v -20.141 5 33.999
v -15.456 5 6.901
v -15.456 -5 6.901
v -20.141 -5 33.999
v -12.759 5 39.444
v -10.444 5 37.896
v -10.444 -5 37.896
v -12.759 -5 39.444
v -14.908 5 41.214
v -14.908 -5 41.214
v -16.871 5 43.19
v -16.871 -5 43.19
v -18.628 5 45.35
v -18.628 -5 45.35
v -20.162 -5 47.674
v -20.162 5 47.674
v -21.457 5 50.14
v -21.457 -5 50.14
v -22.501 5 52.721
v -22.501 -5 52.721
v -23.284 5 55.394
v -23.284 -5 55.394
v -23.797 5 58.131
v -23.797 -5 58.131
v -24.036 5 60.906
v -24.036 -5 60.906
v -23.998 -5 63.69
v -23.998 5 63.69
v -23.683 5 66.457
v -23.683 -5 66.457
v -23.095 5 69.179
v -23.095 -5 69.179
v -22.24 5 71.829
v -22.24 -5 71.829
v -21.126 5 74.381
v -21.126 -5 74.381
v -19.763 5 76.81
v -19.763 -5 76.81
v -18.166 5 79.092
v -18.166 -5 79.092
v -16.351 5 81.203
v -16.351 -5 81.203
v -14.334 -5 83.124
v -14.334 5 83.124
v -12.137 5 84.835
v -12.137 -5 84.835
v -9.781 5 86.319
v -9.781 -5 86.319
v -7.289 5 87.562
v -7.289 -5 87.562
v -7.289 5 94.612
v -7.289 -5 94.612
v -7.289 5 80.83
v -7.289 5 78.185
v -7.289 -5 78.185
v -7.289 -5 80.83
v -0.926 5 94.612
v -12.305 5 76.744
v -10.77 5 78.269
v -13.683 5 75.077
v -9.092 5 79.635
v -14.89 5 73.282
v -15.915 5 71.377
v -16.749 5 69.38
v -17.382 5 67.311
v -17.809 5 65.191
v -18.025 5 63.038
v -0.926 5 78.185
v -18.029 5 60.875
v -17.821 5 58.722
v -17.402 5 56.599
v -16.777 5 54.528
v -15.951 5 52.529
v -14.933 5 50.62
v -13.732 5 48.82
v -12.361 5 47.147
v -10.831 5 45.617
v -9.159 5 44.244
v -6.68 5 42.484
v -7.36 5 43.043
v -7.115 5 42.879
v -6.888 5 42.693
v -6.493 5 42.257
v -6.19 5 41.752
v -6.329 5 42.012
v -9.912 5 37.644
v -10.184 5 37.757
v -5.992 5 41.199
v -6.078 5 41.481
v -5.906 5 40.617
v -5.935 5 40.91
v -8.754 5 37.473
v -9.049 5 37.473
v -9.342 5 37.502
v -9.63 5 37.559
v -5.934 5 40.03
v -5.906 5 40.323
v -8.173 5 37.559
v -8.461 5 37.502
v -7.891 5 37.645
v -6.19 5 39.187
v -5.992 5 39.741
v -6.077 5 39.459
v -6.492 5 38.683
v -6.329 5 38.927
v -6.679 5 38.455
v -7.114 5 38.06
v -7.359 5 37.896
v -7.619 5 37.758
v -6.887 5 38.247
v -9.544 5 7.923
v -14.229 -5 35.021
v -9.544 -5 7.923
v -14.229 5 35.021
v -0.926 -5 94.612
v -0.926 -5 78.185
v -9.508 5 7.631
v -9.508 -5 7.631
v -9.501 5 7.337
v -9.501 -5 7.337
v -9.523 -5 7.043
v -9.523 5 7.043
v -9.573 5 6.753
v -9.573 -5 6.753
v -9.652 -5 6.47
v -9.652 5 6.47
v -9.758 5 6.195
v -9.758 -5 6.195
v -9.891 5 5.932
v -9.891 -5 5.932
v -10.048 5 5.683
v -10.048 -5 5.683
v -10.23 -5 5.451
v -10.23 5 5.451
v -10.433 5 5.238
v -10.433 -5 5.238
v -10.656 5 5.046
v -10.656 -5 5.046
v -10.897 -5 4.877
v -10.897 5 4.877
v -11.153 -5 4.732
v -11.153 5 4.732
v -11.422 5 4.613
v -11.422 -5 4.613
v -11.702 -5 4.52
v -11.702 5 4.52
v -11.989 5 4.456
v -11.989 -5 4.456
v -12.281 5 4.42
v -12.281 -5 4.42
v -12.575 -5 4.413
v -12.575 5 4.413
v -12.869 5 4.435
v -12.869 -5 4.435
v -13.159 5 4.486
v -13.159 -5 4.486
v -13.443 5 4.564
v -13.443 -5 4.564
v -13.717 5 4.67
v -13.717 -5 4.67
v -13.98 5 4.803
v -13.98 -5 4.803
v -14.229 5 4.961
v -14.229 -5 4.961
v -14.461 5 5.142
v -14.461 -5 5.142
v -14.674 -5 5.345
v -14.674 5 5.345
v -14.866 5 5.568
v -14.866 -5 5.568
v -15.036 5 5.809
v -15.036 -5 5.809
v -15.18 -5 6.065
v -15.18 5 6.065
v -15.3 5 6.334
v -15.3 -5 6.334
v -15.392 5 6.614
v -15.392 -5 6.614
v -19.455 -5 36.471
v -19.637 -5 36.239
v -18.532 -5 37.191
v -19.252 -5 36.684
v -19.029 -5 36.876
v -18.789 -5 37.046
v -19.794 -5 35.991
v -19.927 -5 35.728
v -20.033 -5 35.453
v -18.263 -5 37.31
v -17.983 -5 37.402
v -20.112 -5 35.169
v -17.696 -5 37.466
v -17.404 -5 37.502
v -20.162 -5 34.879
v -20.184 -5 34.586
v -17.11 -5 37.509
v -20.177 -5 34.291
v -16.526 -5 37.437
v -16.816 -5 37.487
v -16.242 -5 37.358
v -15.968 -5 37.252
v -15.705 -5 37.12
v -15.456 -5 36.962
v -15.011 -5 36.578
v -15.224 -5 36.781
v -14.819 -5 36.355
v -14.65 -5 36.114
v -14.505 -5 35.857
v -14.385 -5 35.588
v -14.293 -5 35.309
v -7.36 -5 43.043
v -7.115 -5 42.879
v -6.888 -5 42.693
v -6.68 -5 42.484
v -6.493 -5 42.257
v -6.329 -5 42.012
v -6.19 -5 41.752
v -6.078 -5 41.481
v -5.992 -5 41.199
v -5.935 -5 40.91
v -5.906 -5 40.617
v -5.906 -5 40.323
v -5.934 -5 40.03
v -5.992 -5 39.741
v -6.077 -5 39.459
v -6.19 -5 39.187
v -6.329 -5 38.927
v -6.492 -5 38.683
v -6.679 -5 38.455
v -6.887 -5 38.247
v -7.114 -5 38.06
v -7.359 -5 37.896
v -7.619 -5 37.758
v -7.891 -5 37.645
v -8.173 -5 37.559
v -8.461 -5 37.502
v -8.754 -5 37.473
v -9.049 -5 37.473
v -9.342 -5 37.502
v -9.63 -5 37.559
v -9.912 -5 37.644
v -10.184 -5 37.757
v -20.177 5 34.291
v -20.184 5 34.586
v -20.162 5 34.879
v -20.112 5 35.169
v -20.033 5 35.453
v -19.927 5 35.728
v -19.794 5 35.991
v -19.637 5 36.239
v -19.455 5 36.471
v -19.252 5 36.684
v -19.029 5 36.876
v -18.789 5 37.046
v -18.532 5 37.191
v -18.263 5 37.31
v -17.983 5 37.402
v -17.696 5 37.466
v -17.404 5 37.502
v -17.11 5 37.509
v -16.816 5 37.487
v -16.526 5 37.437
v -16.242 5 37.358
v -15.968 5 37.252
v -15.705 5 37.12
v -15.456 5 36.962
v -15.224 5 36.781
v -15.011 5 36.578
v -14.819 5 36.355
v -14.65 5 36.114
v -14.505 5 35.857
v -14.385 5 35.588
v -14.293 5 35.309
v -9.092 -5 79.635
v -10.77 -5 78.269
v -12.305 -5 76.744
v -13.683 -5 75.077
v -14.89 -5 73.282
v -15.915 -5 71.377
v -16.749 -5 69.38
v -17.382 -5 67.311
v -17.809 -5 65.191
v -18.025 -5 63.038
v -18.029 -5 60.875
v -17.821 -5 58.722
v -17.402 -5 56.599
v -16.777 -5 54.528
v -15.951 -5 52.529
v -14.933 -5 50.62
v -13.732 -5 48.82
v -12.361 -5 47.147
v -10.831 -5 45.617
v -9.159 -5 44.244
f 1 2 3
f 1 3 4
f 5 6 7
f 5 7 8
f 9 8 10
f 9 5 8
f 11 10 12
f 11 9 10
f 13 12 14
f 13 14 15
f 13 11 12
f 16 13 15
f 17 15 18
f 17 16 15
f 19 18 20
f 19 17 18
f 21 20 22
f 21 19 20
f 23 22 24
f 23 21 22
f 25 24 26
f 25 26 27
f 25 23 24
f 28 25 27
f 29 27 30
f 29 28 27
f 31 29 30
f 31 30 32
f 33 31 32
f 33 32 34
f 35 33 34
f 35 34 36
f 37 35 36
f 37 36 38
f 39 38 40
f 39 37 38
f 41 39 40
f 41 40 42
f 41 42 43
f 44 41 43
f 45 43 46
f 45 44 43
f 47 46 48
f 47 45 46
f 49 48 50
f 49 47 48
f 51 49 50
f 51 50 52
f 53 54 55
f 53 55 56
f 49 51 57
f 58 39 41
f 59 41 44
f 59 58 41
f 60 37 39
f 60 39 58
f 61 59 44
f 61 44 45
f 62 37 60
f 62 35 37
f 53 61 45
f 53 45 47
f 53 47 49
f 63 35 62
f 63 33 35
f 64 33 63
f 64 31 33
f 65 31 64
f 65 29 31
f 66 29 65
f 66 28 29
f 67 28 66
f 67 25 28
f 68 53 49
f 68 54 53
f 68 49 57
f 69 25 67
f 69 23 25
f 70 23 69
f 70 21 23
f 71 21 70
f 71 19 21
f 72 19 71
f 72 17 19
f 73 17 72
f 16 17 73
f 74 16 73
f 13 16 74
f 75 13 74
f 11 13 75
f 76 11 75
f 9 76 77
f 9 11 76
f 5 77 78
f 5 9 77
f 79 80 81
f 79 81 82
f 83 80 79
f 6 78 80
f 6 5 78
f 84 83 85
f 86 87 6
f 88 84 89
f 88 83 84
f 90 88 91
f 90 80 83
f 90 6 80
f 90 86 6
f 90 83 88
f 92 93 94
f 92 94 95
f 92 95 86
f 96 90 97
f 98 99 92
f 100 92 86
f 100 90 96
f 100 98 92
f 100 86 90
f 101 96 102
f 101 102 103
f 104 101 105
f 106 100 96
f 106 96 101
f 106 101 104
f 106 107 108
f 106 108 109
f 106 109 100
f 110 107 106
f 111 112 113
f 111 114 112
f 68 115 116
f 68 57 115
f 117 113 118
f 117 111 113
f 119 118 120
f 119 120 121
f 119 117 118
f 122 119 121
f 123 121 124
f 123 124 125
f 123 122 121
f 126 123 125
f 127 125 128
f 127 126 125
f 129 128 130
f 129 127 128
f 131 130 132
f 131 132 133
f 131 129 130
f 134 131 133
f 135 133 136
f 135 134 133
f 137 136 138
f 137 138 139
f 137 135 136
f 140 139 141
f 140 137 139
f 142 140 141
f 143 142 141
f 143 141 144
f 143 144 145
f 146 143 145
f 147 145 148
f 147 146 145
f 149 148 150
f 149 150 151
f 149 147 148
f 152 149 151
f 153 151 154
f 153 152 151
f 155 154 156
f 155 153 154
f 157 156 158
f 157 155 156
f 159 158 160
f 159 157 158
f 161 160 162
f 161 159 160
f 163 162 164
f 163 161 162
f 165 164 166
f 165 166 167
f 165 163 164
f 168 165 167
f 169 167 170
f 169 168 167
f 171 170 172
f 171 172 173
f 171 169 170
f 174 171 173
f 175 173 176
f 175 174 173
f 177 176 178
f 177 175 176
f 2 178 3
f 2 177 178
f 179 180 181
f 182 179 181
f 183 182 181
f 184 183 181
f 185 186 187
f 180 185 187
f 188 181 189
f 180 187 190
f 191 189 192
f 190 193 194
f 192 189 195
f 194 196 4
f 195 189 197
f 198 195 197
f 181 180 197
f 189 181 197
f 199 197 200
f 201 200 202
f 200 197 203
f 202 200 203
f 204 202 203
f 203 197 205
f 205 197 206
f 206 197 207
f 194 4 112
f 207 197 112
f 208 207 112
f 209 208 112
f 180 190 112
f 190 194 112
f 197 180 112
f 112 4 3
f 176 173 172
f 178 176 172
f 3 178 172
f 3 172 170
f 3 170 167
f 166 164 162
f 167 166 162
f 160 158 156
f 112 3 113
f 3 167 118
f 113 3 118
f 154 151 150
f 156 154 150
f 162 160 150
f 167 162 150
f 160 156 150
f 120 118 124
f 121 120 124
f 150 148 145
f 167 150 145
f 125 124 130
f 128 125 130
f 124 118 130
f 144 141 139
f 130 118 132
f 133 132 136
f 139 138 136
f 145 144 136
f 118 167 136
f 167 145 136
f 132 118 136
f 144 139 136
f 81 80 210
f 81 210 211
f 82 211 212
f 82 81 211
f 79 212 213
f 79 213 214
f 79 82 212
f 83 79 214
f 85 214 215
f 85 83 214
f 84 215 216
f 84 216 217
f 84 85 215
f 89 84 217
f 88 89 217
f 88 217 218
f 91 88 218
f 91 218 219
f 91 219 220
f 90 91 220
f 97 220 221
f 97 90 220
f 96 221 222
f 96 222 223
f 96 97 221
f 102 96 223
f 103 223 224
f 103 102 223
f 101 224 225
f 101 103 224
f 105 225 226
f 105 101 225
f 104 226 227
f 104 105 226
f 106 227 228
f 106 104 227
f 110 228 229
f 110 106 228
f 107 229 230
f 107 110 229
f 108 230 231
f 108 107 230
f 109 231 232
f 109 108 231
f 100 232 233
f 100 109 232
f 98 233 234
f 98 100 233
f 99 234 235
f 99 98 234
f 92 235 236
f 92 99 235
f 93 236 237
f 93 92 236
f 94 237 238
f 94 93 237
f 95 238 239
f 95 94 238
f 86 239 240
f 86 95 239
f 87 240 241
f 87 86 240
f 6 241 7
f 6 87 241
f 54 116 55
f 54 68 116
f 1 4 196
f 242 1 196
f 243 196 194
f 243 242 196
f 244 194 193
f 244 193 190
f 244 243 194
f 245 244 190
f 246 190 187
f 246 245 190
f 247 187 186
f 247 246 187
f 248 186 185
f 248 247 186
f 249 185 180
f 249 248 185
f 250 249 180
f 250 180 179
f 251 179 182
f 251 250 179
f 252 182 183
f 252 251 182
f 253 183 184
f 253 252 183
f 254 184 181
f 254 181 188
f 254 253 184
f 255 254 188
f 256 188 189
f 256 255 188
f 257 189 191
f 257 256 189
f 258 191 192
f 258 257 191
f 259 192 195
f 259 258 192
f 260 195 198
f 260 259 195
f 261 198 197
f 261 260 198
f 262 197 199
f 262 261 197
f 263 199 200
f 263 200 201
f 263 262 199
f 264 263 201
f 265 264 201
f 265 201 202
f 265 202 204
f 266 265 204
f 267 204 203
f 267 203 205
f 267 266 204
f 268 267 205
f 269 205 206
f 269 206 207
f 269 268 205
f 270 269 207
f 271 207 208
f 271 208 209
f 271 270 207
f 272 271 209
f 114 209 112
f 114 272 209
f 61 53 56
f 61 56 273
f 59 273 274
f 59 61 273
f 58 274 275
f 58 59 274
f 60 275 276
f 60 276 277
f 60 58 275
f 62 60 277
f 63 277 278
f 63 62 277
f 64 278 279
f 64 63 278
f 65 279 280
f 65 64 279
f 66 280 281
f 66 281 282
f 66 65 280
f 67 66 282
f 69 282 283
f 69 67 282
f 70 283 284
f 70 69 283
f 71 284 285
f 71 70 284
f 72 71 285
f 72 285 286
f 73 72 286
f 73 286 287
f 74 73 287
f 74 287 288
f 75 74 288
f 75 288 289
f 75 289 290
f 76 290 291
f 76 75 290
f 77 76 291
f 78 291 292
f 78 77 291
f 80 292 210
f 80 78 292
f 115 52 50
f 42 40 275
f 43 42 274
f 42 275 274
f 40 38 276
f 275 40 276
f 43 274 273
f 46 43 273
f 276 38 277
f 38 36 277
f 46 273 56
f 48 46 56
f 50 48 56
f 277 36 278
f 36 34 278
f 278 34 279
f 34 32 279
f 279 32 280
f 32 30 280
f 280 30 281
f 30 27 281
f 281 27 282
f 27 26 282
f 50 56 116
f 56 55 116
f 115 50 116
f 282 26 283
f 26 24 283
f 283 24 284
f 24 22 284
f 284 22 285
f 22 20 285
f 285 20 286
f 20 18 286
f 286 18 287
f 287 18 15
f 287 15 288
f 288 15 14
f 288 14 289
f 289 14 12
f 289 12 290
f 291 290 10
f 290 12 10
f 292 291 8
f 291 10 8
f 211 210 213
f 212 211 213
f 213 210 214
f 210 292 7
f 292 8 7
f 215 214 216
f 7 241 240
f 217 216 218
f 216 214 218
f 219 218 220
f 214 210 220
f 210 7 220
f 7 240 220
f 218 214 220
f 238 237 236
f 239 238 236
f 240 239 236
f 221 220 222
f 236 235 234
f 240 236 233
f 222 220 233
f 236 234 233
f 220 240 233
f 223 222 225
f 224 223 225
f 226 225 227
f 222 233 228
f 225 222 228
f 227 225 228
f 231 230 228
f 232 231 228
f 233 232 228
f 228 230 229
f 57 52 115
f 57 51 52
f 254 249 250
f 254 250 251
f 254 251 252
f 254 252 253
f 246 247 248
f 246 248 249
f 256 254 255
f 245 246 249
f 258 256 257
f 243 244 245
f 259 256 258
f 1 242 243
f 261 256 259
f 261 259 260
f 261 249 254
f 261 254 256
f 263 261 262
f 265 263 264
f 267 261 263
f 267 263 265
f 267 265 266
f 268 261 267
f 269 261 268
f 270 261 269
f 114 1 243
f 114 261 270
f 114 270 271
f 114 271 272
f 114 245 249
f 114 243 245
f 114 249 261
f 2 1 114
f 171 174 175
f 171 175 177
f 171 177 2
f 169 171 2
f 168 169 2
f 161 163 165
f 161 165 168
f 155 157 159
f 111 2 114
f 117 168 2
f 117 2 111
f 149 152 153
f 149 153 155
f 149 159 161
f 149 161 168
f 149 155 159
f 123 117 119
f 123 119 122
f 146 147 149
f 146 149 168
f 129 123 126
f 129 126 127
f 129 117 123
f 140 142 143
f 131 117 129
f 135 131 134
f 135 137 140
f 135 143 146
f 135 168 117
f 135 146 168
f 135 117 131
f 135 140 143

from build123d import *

# Parameters (mm, degrees)
BOSS_EXTRUDE1_DEPTH   = 5
BOSS_EXTRUDE1_2_DEPTH = 5


with BuildPart() as part:
    # Sketch1 → Boss-Extrude1 (new, symmetric)
    with BuildSketch(Plane(origin=(0, 0, 0), x_dir=(1, 0, 0), z_dir=(0, 1, 0))):
        with BuildLine():
            ThreePointArc((-9.543857098, -7.923381826), (-11.988903978, -4.456142902), (-15.456142902, -6.901189781))
            Line((-15.456142902, -6.901189781), (-20.141189773, -33.999166382))
            ThreePointArc((-20.141189773, -33.999166382), (-17.696142893, -37.466405306), (-14.228903969, -35.021358426))
            Line((-14.228903969, -35.021358426), (-9.543857098, -7.923381826))
        make_face()
    extrude(amount=BOSS_EXTRUDE1_DEPTH, both=True)


with BuildPart() as body_2:
    # Sketch1 → Boss-Extrude1 2 (new, symmetric)
    with BuildSketch(Plane(origin=(0, 0, 0), x_dir=(1, 0, 0), z_dir=(0, 1, 0))):
        with BuildLine():
            Line((-0.926080019, -78.185358395), (-7.289022858, -78.185358395))
            Line((-7.289022858, -78.185358395), (-7.289022858, -80.829934279))
            ThreePointArc((-7.289022858, -80.829934279), (-18.053822992, -61.956577017), (-7.360273261, -43.042758513))
            ThreePointArc((-7.360273261, -43.042758513), (-6.328556235, -38.927474808), (-10.443839941, -37.895757782))
            ThreePointArc((-10.443839941, -37.895757782), (-23.997545105, -63.690081893), (-7.289022858, -87.562144316))
            Line((-7.289022858, -87.562144316), (-7.289022858, -94.612139396))
            Line((-7.289022858, -94.612139396), (-0.926080019, -94.612139396))
            Line((-0.926080019, -94.612139396), (-0.926080019, -78.185358395))
        make_face()
    extrude(amount=BOSS_EXTRUDE1_2_DEPTH, both=True)


solid = Compound([part.part, body_2.part])
